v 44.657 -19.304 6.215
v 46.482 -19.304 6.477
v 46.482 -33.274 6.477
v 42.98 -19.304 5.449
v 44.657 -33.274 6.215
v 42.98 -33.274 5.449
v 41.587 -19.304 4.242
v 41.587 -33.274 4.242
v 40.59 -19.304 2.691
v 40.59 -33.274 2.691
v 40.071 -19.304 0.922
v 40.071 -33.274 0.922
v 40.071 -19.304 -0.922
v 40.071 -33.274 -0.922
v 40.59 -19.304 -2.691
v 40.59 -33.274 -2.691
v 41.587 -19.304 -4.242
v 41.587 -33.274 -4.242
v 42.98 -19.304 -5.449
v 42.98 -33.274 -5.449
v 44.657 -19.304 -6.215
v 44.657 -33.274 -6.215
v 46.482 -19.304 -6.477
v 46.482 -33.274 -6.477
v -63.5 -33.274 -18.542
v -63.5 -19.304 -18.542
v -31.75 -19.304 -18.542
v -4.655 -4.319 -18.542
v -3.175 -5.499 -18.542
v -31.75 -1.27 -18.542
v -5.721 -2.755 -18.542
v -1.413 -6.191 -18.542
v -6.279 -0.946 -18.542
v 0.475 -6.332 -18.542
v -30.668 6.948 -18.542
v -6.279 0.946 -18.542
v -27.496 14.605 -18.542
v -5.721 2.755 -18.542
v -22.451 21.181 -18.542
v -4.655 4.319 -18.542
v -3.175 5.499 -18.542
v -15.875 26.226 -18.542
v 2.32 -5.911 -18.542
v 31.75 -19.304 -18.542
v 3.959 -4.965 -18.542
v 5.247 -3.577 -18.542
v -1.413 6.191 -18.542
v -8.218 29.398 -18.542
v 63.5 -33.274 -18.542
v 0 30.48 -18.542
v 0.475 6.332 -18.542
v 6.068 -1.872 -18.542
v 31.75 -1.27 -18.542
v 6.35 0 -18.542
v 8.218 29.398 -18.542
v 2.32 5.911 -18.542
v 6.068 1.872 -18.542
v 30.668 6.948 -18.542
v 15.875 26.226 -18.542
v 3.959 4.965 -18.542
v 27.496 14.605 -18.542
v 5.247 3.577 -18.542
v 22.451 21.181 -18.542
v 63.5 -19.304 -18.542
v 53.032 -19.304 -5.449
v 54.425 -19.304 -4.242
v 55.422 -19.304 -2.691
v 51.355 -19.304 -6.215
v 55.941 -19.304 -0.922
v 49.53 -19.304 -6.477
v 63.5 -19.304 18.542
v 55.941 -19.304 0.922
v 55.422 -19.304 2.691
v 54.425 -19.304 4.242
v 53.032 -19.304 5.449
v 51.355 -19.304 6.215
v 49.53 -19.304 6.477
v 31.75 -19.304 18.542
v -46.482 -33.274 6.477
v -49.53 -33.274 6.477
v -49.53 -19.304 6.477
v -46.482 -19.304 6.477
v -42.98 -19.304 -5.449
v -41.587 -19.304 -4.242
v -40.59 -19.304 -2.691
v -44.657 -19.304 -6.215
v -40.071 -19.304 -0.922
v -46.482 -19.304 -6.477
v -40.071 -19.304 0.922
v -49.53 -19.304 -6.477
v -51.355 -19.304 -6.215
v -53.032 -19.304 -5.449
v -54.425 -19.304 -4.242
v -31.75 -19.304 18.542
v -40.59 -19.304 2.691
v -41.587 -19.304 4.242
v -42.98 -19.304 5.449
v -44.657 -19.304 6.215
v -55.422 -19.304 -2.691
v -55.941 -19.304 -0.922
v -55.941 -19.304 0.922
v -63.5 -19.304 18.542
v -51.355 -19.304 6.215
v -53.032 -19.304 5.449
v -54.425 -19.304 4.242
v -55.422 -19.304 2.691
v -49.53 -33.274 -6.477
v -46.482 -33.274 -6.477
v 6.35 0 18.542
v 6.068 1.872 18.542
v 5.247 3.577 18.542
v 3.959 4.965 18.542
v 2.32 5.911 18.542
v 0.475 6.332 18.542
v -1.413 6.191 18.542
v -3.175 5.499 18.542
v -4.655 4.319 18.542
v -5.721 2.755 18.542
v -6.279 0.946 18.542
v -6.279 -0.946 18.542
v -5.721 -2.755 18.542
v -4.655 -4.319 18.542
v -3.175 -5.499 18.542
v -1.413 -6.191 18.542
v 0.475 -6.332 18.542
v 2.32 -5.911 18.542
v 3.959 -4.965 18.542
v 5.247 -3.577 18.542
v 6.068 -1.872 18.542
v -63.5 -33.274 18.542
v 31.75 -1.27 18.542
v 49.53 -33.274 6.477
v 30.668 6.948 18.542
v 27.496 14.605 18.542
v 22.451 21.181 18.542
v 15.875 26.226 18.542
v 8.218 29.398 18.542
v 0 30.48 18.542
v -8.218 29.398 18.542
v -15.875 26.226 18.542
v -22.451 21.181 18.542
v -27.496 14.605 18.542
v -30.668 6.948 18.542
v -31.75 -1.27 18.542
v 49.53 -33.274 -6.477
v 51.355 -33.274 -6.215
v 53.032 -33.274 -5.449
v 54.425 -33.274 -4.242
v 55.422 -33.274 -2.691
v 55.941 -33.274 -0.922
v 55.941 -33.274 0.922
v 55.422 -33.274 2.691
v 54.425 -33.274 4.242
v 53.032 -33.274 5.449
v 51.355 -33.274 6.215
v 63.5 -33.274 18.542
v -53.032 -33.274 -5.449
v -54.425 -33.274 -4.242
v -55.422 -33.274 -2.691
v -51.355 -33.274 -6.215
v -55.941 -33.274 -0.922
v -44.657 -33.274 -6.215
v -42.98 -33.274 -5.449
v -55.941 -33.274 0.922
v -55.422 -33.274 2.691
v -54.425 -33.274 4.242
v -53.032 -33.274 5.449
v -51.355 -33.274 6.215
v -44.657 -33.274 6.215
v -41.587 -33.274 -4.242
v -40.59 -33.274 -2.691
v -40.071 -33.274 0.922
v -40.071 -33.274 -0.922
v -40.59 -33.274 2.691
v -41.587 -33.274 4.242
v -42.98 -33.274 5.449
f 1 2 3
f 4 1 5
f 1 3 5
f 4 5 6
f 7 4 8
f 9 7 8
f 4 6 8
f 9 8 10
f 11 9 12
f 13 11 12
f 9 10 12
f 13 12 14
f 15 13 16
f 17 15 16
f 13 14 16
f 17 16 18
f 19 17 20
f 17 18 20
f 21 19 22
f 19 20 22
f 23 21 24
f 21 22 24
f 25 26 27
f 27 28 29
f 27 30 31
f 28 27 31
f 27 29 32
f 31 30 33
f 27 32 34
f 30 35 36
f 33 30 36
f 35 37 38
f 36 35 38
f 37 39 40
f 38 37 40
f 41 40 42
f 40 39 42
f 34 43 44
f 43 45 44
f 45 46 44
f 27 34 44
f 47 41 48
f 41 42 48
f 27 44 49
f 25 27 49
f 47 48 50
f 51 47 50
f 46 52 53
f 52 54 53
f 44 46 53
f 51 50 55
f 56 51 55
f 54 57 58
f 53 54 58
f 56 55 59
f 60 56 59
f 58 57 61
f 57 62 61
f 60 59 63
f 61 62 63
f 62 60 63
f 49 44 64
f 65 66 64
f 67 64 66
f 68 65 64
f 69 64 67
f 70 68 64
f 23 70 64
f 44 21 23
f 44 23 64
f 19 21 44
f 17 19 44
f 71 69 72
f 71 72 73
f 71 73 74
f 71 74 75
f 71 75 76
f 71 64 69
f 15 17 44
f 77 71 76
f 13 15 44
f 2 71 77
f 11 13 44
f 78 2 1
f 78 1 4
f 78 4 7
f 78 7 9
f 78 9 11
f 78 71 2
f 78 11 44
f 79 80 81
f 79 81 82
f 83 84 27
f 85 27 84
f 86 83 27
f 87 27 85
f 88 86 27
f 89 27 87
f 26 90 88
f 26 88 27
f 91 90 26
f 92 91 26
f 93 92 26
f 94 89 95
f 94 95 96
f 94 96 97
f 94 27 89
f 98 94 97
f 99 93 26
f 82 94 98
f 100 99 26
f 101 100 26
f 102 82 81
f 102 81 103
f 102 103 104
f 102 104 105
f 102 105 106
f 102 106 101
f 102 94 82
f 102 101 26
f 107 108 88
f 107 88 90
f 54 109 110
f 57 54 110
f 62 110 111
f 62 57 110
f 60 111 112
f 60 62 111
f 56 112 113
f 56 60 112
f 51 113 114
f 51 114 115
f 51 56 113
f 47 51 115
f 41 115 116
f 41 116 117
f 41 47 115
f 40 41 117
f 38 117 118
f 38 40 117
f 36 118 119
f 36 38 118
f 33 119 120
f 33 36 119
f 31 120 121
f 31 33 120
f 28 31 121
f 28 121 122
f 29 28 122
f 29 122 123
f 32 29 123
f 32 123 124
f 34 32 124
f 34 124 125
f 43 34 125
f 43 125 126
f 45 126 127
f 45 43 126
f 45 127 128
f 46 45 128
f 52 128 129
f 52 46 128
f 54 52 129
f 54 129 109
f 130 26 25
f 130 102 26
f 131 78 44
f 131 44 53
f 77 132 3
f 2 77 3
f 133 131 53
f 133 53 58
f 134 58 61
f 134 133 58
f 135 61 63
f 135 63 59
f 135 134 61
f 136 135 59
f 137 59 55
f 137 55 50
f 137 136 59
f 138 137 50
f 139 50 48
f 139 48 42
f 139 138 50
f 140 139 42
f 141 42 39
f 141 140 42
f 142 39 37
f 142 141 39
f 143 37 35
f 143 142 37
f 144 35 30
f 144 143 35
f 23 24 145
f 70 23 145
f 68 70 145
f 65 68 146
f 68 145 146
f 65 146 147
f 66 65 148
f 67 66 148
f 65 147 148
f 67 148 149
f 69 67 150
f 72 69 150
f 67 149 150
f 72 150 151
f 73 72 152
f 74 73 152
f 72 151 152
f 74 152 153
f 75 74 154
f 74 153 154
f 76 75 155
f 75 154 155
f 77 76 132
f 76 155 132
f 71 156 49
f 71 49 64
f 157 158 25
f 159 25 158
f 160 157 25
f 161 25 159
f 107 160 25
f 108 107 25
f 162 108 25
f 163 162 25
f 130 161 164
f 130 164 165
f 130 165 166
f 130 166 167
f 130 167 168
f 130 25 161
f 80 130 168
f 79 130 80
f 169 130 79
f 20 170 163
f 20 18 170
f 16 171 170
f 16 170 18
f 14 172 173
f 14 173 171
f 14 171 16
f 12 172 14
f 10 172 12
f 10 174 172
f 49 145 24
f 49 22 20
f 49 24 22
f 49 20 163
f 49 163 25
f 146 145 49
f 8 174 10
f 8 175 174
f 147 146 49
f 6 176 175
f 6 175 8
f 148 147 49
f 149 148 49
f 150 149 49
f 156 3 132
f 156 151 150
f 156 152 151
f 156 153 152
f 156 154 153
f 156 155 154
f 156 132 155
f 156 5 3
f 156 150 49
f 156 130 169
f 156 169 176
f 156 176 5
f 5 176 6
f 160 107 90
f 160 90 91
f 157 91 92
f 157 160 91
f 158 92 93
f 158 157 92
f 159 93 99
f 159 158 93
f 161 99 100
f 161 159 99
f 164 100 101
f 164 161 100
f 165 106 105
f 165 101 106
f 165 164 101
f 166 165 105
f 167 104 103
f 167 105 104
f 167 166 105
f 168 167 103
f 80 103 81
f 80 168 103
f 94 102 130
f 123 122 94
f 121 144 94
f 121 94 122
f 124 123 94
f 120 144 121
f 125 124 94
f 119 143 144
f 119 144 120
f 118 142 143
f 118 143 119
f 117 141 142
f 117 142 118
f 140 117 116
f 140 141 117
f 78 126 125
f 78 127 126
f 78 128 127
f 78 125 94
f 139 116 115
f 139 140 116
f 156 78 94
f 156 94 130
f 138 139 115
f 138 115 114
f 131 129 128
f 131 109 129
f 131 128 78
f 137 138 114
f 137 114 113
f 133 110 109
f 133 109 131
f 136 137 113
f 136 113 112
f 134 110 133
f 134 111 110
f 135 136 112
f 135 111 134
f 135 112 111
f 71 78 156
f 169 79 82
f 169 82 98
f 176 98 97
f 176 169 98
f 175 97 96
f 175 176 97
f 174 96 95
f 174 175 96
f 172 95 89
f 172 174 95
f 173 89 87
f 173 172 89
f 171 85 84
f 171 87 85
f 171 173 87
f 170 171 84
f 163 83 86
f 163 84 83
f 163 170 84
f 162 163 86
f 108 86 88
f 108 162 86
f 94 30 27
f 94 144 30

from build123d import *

# Parameters (mm, degrees)
SKETCH1_R           = 6.35
BOSS_EXTRUDE1_DEPTH = 18.542
CUT_EXTRUDE1_DEPTH  = 92.872891976


with BuildPart() as part:
    # Sketch1 → Boss-Extrude1 (new, symmetric)
    with BuildSketch(Plane.XY):
        with BuildLine():
            Line((-63.5, -33.274), (63.5, -33.274))
            Line((63.5, -33.274), (63.5, -19.304))
            Line((63.5, -19.304), (31.75, -19.304))
            Line((31.75, -19.304), (31.75, -1.27))
            ThreePointArc((31.75, -1.27), (0, 30.48), (-31.75, -1.27))
            Line((-31.75, -1.27), (-31.75, -19.304))
            Line((-31.75, -19.304), (-63.5, -19.304))
            Line((-63.5, -19.304), (-63.5, -33.274))
        make_face()
        Circle(SKETCH1_R, mode=Mode.SUBTRACT)
    extrude(amount=BOSS_EXTRUDE1_DEPTH, both=True)

    # Sketch2 → Cut-Extrude1 (cut, through all)
    with BuildSketch(Plane.XZ.offset(33.274)):
        with BuildLine():
            Line((-49.53, 6.477), (-46.482, 6.477))
            ThreePointArc((-46.482, 6.477), (-40.005, 0), (-46.482, -6.477))
            Line((-46.482, -6.477), (-49.53, -6.477))
            ThreePointArc((-49.53, -6.477), (-56.007, 0), (-49.53, 6.477))
        make_face()
        with BuildLine():
            Line((49.53, 6.477), (46.482, 6.477))
            ThreePointArc((46.482, 6.477), (40.005, 0), (46.482, -6.477))
            Line((46.482, -6.477), (49.53, -6.477))
            ThreePointArc((49.53, -6.477), (56.007, 0), (49.53, 6.477))
        make_face()
    extrude(amount=-CUT_EXTRUDE1_DEPTH, mode=Mode.SUBTRACT)


solid = part.part
